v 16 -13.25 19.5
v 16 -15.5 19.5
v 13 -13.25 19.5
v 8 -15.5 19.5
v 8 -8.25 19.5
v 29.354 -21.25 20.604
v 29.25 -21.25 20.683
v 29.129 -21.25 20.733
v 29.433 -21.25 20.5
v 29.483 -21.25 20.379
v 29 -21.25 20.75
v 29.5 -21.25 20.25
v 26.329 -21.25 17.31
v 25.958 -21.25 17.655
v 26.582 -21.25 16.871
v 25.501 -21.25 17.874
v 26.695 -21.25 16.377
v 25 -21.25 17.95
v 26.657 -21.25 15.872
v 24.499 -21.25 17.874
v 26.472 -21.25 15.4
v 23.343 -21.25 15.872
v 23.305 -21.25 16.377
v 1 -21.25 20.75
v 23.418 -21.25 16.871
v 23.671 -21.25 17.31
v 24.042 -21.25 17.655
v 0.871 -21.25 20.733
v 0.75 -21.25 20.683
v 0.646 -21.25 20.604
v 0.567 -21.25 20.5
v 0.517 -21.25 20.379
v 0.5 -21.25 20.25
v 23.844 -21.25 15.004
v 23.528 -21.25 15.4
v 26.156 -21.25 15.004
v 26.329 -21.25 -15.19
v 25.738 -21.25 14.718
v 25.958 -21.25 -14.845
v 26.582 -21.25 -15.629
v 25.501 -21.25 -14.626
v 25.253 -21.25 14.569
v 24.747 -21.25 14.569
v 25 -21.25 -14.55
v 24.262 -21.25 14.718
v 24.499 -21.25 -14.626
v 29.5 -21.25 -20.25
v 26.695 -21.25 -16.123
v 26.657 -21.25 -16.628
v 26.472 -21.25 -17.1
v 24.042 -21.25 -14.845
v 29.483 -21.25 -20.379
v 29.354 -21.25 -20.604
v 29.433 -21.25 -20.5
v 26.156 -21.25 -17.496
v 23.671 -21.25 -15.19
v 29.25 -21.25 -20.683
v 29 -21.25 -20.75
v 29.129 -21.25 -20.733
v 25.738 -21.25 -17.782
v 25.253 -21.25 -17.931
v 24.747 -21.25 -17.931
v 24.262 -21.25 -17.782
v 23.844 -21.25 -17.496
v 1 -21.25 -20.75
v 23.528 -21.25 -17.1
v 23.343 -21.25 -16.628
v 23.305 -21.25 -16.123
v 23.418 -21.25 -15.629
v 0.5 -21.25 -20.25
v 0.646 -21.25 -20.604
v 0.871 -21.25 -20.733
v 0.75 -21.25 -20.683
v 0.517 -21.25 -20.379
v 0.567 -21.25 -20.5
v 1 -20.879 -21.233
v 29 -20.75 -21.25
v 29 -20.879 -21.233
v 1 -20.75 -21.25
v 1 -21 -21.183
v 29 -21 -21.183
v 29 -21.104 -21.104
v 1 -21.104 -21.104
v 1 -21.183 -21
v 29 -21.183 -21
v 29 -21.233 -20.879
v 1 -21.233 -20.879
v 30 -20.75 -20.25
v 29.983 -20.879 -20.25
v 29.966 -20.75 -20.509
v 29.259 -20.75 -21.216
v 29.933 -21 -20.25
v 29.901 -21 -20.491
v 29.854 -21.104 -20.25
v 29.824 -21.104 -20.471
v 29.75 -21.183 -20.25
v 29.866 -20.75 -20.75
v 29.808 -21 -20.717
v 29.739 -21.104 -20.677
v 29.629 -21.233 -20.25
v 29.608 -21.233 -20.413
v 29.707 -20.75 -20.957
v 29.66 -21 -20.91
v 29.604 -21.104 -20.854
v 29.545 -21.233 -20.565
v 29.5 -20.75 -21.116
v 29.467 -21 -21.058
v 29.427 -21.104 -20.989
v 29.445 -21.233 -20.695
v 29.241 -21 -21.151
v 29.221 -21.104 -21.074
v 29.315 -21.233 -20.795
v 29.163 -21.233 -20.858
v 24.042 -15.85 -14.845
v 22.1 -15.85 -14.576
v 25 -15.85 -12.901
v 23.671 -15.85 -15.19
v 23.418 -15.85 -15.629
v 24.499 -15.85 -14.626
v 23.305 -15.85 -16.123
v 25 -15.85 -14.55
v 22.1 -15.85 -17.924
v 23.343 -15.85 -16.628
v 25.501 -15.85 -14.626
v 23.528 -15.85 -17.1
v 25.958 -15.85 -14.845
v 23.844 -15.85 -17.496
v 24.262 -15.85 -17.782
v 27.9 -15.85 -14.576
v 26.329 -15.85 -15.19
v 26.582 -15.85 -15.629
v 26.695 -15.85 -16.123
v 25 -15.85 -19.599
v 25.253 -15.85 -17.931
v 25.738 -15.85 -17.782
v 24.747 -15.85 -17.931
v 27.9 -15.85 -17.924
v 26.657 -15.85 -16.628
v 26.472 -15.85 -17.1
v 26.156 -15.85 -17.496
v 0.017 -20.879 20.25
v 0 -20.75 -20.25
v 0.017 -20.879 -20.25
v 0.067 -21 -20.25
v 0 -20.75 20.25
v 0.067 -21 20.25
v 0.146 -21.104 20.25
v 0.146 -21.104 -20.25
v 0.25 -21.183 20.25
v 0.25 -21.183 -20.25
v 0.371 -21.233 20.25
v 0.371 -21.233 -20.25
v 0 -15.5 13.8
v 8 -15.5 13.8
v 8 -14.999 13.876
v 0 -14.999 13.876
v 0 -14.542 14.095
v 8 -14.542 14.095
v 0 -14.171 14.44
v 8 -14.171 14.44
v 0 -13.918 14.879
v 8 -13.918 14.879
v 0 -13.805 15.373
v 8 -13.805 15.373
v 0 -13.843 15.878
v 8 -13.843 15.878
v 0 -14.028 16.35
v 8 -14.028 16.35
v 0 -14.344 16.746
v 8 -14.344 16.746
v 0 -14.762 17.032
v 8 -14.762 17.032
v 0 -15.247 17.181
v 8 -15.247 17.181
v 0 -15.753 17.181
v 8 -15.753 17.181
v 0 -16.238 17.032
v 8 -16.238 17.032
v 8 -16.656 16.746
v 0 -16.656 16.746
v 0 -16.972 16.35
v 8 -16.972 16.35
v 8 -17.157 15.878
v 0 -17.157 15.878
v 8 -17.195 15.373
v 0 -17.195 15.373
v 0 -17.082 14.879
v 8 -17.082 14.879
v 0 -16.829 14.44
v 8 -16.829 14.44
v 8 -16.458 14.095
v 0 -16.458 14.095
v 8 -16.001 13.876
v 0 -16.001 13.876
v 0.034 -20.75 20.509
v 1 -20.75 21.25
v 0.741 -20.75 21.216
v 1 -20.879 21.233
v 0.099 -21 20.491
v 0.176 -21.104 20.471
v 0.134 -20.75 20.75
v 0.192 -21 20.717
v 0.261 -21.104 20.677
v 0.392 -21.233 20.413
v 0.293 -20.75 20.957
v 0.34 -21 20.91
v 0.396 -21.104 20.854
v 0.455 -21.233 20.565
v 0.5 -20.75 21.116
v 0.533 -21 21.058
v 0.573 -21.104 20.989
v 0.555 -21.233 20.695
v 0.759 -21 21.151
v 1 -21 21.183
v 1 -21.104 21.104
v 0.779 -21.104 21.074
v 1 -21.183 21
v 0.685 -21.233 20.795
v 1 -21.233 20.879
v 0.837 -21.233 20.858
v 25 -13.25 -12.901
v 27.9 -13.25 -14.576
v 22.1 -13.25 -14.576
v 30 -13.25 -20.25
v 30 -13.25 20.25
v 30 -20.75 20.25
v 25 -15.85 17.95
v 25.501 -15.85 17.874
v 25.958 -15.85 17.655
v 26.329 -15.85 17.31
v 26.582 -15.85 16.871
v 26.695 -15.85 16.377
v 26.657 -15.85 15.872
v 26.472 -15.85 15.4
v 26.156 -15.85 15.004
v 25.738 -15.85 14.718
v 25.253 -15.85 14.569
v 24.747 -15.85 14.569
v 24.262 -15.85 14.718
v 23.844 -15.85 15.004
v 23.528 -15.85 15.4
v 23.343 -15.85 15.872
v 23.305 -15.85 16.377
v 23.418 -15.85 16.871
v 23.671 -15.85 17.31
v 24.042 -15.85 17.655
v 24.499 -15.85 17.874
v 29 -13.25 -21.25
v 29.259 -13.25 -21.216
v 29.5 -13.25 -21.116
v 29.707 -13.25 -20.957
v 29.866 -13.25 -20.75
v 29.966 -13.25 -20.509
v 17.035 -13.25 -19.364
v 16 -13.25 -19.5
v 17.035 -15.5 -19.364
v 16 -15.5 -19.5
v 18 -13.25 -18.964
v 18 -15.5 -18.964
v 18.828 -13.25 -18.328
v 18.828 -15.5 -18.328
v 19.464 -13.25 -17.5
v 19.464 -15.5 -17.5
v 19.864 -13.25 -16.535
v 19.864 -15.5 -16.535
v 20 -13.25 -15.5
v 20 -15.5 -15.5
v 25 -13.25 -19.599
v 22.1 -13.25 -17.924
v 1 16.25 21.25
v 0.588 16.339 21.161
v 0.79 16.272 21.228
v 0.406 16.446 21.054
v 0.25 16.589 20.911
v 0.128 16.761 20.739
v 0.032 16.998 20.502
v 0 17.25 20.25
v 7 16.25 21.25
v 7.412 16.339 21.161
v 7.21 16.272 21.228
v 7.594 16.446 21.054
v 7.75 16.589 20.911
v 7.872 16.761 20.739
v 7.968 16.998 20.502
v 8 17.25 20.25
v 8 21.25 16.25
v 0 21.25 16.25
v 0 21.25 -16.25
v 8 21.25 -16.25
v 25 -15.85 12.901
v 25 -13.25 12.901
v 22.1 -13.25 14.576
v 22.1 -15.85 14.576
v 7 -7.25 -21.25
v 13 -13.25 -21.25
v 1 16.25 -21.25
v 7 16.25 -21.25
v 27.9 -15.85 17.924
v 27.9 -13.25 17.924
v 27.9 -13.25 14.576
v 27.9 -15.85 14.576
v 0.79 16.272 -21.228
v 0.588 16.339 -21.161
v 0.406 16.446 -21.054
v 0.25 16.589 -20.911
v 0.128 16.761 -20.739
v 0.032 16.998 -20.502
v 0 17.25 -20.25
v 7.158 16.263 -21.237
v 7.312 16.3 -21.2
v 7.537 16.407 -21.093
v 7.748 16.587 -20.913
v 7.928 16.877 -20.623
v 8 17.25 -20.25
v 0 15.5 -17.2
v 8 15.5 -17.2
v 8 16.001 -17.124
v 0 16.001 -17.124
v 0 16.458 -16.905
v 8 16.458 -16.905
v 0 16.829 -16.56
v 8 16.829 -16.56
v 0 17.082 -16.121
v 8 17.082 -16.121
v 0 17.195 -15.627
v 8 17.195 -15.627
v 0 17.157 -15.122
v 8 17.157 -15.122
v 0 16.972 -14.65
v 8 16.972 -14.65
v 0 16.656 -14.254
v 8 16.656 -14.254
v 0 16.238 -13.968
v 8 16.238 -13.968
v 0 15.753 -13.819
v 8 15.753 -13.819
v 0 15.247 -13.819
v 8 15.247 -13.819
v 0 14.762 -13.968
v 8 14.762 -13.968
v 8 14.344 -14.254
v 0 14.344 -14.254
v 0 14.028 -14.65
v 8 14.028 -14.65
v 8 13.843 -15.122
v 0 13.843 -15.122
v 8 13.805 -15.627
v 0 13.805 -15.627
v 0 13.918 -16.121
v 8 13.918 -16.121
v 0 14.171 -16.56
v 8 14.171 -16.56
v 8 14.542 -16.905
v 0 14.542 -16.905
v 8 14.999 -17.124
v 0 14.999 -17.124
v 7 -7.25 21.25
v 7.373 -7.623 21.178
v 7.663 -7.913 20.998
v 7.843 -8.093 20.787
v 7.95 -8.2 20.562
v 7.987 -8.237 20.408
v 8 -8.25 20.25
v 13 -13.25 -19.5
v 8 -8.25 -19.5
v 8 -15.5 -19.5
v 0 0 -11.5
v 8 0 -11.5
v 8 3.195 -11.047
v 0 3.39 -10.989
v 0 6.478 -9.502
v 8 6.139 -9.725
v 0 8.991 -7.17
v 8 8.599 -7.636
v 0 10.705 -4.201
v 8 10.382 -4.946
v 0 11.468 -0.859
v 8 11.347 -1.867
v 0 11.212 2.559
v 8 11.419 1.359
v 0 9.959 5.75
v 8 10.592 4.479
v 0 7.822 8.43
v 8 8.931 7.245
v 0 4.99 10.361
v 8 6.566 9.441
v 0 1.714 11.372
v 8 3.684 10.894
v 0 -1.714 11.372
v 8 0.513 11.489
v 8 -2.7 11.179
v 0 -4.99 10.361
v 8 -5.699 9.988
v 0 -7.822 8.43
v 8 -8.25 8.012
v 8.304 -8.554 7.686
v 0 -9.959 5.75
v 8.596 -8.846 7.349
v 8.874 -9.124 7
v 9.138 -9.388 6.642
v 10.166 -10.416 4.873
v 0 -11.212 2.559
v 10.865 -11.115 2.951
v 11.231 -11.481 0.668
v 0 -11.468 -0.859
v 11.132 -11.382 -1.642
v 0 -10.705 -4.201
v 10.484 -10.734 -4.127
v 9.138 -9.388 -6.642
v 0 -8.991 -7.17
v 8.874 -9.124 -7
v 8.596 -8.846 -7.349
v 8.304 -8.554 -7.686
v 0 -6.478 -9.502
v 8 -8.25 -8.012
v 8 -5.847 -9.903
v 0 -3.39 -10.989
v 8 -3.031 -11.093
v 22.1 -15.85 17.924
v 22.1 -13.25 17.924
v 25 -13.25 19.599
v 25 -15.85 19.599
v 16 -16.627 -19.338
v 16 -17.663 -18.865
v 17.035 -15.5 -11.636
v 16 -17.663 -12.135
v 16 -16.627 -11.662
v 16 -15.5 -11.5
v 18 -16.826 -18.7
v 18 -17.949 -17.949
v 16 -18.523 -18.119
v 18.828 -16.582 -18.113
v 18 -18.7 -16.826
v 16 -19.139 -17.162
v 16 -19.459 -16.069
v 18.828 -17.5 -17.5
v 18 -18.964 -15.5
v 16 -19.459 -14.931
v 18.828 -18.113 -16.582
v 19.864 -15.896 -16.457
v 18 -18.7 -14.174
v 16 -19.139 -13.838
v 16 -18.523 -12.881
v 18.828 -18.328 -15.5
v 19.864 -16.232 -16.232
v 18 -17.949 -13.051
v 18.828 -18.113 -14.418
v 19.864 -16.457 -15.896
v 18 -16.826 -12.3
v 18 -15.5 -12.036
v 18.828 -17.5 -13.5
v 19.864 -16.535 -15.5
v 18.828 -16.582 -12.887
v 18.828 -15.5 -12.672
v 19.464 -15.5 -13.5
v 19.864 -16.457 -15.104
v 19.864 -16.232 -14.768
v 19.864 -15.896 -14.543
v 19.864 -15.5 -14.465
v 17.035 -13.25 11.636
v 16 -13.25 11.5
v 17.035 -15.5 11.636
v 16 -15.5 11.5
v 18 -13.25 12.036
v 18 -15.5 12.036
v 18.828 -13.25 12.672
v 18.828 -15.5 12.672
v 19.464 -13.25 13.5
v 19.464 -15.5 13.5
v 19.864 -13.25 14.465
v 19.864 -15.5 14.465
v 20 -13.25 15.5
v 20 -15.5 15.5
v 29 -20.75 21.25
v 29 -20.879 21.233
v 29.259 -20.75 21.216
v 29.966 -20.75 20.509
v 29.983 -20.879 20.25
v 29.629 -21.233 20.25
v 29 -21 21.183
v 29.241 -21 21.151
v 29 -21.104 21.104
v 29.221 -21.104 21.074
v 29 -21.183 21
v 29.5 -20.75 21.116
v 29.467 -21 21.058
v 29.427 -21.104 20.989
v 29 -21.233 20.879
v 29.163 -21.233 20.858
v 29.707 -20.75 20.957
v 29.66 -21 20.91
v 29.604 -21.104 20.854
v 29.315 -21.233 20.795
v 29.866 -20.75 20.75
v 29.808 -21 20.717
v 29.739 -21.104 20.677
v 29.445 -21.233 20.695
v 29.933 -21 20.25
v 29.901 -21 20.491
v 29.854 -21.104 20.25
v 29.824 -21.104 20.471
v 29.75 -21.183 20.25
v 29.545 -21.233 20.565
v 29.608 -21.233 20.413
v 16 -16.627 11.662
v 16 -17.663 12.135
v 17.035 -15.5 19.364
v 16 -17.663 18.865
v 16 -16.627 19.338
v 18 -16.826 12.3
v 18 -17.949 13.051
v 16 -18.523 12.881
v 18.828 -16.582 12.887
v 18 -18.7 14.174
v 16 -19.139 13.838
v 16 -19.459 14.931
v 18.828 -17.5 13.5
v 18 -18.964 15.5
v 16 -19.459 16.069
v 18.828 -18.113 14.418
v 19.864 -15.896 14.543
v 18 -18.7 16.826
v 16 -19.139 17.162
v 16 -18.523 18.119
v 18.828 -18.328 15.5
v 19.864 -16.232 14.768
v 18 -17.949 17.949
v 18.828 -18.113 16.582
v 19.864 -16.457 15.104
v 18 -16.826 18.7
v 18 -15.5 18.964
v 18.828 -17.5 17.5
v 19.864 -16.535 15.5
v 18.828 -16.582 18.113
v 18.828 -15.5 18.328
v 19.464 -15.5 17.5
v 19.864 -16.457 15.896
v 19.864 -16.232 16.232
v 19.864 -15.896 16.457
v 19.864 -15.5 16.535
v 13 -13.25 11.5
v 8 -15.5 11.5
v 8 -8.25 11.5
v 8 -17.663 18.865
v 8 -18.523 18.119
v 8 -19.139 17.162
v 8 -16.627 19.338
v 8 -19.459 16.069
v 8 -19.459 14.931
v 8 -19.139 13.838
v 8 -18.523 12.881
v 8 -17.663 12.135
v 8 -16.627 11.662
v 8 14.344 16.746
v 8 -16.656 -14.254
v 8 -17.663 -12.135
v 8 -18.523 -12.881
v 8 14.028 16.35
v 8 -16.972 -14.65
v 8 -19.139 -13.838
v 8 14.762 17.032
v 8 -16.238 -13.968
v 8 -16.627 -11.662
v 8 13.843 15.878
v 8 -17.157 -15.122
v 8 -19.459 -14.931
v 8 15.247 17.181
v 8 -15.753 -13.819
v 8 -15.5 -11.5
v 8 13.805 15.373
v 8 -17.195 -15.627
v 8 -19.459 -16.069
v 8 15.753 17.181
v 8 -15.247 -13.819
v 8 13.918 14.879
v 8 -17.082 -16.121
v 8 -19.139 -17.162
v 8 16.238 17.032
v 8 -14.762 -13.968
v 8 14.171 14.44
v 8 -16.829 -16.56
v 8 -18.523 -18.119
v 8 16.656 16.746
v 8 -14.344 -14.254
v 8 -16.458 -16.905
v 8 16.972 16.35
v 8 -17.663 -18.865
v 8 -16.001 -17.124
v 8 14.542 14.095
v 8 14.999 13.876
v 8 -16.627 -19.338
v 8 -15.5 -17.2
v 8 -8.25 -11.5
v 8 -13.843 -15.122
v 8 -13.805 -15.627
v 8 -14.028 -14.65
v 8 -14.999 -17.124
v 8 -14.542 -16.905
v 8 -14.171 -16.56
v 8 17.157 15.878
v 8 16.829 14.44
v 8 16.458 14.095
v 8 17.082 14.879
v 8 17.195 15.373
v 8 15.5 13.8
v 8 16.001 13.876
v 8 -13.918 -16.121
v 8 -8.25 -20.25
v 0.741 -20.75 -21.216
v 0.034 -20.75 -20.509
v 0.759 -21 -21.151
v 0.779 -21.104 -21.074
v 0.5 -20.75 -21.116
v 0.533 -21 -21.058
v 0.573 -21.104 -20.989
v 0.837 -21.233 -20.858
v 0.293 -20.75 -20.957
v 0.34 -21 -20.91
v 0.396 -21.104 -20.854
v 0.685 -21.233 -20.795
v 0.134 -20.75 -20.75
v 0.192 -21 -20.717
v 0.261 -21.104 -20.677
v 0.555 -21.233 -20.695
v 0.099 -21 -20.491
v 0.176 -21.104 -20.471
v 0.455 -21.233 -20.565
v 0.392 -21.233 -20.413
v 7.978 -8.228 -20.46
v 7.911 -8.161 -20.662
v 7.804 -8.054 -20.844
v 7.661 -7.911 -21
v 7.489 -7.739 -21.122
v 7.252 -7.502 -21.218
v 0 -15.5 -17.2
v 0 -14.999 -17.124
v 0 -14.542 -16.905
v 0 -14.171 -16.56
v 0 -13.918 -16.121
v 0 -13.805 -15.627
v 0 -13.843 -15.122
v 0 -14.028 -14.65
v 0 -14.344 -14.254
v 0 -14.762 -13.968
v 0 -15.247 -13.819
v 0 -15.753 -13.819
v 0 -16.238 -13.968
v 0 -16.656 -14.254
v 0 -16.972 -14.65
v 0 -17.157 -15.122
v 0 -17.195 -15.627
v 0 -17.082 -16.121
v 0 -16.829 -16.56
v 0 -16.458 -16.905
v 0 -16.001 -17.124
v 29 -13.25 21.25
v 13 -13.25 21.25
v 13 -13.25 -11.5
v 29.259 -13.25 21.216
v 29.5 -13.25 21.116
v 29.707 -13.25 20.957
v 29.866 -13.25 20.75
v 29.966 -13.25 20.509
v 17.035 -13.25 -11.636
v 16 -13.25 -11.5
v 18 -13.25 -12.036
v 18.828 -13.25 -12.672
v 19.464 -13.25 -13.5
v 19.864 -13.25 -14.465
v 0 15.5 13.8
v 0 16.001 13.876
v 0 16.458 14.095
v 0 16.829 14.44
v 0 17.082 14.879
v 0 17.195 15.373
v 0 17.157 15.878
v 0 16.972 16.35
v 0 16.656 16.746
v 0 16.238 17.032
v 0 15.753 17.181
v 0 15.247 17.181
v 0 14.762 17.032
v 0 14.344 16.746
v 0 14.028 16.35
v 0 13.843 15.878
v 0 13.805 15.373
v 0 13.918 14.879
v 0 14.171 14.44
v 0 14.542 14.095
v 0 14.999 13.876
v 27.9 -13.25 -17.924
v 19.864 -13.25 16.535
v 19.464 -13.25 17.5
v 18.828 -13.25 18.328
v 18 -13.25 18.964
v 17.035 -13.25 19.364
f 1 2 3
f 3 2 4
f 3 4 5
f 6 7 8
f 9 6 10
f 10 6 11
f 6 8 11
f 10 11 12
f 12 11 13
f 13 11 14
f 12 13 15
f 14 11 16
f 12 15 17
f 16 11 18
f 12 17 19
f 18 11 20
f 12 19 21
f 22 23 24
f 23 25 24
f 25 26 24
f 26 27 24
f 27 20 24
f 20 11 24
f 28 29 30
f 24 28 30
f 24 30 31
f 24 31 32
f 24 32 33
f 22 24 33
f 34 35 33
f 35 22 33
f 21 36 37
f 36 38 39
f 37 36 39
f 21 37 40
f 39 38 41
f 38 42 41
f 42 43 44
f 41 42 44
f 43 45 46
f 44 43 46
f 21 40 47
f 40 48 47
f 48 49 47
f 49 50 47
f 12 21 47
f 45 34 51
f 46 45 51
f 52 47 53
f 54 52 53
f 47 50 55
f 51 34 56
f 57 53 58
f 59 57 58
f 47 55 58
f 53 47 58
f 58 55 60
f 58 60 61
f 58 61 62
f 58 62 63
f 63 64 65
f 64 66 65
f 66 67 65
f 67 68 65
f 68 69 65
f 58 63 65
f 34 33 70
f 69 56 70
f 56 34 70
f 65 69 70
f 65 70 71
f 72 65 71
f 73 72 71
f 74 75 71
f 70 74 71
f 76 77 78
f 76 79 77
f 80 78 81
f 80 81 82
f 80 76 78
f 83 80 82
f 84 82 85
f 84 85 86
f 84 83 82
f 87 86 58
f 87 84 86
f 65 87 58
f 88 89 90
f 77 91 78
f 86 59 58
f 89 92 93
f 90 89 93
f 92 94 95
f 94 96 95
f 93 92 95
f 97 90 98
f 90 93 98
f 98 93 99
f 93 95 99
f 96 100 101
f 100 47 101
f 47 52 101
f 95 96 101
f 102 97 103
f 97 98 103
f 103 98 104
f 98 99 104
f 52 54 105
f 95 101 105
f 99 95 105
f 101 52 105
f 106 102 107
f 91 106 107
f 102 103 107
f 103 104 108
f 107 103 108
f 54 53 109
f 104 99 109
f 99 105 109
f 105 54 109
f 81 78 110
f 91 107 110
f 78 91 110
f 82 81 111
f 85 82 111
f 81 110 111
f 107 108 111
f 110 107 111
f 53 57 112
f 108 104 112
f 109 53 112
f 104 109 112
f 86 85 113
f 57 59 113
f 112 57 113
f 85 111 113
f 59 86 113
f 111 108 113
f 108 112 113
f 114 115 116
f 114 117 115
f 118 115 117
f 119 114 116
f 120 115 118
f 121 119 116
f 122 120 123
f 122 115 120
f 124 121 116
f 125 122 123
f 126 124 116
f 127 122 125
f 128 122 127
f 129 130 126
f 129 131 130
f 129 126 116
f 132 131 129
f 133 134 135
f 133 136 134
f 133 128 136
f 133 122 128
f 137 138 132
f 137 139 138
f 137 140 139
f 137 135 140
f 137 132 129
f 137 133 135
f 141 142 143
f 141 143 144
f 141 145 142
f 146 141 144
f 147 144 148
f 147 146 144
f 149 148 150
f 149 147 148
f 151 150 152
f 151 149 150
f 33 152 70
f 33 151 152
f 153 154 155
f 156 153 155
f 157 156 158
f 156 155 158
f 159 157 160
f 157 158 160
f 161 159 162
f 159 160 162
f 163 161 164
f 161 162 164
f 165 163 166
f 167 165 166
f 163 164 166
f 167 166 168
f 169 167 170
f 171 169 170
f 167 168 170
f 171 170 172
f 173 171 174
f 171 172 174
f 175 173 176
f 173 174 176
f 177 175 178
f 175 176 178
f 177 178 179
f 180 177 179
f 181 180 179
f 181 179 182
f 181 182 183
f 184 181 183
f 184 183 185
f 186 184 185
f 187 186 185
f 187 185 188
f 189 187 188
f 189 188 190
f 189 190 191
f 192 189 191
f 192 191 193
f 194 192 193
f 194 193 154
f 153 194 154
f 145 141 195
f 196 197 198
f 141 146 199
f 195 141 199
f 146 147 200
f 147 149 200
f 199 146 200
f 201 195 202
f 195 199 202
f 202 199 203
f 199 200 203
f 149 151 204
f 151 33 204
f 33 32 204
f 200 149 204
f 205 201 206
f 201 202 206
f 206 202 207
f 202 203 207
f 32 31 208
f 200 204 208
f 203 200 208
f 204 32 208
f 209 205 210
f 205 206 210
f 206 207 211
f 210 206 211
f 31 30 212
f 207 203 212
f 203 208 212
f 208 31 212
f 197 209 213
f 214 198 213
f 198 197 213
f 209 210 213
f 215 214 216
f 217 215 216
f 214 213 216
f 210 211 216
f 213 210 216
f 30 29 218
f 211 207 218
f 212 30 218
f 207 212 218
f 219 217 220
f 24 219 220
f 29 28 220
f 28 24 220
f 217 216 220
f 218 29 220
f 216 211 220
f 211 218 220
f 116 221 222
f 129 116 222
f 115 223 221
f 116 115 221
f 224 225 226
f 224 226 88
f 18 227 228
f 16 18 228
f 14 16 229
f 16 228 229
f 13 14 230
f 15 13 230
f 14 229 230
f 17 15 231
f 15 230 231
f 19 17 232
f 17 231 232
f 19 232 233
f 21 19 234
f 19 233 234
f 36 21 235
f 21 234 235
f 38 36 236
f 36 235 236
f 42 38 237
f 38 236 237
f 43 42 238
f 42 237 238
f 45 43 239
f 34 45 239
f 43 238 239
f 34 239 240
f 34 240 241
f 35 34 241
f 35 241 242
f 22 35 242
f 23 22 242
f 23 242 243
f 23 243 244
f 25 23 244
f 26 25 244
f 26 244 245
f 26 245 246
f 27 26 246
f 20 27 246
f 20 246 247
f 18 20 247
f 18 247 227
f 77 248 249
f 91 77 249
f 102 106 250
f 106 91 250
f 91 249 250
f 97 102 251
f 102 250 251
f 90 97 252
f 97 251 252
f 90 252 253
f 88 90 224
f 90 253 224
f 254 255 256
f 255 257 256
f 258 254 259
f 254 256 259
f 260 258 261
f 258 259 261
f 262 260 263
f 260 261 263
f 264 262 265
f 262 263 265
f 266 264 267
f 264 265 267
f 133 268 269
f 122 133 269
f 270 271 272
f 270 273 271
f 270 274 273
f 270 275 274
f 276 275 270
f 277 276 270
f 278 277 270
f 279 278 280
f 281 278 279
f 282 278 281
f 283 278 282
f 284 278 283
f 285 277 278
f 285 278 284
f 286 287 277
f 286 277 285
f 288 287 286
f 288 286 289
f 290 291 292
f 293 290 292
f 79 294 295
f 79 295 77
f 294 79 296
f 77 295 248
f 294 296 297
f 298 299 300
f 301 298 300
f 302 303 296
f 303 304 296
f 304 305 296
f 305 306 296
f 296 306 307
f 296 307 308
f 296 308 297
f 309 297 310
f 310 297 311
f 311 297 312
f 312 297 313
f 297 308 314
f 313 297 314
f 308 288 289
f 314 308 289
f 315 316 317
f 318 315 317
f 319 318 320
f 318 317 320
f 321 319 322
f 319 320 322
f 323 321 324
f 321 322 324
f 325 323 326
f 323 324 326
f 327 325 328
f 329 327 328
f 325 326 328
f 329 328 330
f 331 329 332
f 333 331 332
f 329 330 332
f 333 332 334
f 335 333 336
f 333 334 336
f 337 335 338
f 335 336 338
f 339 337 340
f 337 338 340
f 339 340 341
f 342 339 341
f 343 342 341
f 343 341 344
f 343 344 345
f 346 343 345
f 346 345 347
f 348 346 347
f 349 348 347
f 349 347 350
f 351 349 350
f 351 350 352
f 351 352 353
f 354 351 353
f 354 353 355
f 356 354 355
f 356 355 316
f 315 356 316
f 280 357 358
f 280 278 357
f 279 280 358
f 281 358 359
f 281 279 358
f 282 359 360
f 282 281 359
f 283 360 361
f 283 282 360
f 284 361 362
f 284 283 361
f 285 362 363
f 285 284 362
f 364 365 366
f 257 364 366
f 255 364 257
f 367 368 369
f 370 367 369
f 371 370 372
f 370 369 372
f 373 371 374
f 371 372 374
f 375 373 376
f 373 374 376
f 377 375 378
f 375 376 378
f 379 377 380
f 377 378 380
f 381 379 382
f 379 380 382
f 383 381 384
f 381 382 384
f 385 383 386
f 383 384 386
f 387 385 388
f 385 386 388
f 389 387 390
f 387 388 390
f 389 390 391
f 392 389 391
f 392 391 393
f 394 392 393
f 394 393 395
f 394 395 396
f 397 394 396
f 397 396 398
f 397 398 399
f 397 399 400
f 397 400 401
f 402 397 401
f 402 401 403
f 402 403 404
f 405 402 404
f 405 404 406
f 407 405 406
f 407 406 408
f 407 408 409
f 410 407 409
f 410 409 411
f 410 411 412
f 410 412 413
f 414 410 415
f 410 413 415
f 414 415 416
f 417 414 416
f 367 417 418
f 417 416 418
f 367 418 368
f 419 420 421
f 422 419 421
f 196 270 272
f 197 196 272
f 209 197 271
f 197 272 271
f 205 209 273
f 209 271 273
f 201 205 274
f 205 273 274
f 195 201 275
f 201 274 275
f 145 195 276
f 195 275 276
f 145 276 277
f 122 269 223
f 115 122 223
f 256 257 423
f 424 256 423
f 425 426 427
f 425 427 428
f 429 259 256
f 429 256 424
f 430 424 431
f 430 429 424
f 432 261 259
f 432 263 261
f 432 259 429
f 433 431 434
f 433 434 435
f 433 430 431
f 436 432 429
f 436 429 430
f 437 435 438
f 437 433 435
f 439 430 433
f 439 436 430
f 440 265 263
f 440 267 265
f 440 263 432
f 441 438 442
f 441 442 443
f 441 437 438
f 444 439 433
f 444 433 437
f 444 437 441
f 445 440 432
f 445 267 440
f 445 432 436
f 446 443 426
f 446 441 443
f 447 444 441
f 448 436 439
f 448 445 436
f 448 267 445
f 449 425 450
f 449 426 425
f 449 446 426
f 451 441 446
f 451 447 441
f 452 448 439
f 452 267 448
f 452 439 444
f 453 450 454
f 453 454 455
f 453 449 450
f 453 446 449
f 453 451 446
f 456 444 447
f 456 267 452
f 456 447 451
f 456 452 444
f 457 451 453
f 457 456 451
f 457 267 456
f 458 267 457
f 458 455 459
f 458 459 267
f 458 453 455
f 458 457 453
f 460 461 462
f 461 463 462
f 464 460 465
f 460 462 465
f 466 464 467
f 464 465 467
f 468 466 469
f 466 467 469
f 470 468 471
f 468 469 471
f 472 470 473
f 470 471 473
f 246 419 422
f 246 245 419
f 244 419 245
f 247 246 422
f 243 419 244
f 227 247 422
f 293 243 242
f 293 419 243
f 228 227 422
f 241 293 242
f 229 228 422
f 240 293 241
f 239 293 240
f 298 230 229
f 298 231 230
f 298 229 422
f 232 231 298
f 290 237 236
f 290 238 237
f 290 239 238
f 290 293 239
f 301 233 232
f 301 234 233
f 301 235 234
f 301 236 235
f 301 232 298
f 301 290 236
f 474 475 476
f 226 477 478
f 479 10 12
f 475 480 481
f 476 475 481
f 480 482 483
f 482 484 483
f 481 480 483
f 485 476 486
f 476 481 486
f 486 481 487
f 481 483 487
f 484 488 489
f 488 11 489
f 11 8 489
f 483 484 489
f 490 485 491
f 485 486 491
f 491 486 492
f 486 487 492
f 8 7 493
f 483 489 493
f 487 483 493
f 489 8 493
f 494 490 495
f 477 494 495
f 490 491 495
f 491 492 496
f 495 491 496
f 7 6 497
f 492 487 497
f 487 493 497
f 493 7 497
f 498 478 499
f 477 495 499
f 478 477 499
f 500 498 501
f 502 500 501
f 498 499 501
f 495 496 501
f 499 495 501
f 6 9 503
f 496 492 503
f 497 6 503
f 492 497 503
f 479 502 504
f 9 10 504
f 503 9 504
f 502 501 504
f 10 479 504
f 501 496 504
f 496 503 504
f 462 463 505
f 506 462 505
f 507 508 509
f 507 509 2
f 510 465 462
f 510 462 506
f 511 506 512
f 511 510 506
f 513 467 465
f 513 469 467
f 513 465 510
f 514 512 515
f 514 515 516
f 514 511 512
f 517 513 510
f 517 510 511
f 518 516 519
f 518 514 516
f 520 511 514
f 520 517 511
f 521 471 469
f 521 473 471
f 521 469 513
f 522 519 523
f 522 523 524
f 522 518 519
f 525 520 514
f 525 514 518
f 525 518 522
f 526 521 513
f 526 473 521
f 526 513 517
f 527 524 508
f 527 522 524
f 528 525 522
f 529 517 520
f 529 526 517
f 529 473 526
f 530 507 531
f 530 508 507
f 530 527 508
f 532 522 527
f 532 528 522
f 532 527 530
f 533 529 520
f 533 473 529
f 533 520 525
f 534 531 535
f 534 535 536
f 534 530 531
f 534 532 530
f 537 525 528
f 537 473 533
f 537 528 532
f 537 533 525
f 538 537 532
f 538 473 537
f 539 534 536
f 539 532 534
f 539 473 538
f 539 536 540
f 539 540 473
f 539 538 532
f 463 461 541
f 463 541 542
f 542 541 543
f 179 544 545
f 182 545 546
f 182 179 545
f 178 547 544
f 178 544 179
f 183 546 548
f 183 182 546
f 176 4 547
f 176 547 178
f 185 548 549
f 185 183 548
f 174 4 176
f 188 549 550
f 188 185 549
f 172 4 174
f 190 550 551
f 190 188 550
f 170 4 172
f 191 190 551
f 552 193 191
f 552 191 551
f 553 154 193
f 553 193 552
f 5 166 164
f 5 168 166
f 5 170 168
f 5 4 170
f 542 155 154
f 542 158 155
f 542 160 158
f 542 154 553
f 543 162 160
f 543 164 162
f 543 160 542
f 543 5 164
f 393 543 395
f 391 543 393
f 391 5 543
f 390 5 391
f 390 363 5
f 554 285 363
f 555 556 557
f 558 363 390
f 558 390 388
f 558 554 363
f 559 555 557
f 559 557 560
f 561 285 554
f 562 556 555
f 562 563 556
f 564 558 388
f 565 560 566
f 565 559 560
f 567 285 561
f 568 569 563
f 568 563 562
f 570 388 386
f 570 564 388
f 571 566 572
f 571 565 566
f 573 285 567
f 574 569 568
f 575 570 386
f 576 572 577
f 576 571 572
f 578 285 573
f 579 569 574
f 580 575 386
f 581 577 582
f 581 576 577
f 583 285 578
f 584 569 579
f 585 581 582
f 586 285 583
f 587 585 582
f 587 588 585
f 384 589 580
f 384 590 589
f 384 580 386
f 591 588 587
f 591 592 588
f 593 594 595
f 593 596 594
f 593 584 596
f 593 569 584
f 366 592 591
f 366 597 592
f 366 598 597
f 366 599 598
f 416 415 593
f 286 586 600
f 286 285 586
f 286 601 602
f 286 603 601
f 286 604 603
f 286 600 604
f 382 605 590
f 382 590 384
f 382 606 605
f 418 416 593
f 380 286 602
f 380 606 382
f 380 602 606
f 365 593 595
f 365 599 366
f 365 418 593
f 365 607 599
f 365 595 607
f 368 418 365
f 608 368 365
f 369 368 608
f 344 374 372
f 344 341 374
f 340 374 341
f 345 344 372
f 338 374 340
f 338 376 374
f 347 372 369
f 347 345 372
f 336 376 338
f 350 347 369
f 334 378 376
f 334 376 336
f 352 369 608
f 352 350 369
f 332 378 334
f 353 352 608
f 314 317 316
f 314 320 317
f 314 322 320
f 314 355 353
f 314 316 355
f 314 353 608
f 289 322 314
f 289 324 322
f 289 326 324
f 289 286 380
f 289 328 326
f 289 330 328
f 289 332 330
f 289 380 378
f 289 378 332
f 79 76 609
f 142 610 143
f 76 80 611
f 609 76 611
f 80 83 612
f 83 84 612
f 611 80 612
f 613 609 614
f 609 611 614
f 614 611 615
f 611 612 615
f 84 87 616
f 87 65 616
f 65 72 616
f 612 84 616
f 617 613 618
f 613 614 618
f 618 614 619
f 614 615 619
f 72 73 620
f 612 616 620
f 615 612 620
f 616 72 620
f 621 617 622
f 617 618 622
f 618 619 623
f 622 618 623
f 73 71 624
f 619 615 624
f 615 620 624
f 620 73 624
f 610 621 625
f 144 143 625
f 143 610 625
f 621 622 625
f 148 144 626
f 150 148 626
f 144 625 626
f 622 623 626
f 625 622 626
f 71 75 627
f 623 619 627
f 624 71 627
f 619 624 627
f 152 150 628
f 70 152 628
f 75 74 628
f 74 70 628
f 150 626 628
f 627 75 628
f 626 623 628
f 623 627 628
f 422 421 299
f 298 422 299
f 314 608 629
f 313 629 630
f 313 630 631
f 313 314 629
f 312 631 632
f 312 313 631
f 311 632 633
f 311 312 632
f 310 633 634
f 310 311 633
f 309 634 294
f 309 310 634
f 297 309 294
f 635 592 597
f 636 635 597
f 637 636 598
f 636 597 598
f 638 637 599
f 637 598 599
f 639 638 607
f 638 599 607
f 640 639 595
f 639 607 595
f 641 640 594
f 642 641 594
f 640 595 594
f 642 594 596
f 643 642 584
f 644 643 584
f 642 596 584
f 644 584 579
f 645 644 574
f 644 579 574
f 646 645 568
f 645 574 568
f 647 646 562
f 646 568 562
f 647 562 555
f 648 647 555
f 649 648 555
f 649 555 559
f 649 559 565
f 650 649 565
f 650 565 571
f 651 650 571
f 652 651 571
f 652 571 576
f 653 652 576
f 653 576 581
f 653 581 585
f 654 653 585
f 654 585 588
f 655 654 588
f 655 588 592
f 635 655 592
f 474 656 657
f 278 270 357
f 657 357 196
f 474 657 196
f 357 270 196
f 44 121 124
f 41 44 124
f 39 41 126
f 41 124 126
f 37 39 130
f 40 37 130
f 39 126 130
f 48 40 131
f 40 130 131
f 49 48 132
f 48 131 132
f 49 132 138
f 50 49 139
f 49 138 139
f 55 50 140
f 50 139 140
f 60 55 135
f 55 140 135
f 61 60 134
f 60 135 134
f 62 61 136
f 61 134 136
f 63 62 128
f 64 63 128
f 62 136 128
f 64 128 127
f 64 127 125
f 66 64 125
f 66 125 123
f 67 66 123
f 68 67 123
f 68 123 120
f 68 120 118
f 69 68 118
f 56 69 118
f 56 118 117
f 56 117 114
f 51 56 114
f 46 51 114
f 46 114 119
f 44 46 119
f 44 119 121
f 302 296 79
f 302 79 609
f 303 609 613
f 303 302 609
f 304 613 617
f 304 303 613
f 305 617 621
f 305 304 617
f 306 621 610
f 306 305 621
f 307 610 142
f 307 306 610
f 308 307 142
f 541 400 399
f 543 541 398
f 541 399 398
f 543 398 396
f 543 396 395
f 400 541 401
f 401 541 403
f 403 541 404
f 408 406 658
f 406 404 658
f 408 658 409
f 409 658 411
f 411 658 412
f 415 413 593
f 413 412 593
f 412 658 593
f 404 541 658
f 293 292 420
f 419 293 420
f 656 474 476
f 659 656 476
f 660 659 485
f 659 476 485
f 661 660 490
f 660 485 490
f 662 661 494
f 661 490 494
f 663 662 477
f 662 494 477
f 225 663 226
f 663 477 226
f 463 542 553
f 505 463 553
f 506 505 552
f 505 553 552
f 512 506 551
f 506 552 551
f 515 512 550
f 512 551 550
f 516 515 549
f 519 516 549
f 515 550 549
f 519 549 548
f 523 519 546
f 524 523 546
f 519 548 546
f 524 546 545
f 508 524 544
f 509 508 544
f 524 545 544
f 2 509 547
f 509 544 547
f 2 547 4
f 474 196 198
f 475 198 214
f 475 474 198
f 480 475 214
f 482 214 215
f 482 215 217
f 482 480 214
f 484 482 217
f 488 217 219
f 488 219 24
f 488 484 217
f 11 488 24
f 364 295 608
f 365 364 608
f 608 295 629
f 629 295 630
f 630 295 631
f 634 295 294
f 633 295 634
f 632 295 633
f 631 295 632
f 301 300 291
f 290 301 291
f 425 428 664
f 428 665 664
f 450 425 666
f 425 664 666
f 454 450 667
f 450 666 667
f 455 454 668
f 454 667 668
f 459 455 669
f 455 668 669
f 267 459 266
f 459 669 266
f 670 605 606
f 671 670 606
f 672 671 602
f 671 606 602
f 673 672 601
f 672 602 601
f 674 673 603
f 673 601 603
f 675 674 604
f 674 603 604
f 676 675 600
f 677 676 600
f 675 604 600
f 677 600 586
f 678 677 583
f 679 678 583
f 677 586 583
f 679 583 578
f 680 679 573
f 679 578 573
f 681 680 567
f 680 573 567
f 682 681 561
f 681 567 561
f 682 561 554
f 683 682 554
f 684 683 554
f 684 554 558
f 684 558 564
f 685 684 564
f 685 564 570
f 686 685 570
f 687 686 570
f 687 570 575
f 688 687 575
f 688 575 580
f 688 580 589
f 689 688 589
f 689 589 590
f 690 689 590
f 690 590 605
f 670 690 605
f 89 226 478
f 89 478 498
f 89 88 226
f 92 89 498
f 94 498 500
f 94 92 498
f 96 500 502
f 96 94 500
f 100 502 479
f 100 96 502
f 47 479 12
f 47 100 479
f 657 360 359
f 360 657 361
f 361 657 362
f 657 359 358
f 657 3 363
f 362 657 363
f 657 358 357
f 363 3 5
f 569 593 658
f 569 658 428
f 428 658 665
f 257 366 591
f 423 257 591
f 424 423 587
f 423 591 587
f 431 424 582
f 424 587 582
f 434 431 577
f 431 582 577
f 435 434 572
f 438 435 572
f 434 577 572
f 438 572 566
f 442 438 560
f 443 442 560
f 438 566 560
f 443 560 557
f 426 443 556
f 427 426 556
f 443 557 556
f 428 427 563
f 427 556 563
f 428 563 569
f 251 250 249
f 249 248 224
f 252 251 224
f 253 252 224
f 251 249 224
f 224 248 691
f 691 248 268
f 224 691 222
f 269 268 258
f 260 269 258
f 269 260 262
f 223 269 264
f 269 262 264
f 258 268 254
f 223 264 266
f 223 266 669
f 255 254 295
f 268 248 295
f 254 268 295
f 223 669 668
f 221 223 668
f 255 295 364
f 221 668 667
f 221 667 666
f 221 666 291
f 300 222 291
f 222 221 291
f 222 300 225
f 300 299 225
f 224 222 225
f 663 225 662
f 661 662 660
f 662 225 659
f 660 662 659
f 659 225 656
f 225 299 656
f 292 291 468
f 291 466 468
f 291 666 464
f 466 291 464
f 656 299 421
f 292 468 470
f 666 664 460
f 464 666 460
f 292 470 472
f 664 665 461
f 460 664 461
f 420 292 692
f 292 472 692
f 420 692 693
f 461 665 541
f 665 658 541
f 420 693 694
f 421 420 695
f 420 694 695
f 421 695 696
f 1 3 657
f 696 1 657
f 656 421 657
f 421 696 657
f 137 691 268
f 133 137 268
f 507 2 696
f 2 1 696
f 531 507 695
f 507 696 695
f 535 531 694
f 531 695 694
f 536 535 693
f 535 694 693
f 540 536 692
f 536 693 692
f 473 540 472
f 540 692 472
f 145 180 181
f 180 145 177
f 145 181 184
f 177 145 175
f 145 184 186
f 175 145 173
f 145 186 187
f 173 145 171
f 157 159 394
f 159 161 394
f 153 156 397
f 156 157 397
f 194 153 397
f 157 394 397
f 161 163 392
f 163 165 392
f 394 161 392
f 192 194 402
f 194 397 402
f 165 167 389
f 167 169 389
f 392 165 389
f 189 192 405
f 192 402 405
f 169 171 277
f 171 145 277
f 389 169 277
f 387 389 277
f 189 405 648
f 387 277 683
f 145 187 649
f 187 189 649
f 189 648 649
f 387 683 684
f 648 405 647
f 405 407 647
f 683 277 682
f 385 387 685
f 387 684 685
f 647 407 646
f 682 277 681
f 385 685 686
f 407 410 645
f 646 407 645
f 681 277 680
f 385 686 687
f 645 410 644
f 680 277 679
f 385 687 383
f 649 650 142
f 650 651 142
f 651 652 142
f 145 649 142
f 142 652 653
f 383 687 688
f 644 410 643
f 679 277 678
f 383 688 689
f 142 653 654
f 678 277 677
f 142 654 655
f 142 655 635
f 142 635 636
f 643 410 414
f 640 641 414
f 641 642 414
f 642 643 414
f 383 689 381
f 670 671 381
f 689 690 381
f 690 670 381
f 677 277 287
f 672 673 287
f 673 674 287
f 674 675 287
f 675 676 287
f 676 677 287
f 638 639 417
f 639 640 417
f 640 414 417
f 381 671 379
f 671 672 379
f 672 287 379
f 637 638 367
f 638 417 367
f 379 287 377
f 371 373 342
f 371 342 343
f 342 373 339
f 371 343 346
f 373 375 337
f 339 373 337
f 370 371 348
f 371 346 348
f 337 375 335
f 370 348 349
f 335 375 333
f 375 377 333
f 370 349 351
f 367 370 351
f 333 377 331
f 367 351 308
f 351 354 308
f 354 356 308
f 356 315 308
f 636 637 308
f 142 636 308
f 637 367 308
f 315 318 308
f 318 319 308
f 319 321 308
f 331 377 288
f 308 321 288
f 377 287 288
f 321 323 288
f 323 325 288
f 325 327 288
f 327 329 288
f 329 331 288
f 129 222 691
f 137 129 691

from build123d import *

# Parameters (mm, degrees)
SKETCH1_W           = 42.5
SKETCH1_H           = 42.5
BOSS_EXTRUDE1_DEPTH = 8
SKETCH2_R           = 1.7
SKETCH2_R_2         = 11.5
CUT_EXTRUDE1_DEPTH  = 35
BOSS_EXTRUDE2_DEPTH = 22
BOSS_EXTRUDE3_REACH = 52.416
SKETCH5_W           = 10
SKETCH5_H           = 42.5
FILLET1_R           = 4
FILLET2_R           = 4
CHAMFER2_SIZE       = 5
CUT_EXTRUDE2_DEPTH  = 2.6
SKETCH7_R           = 1.7
CUT_EXTRUDE3_DEPTH  = 10.6
CHAMFER3_SIZE       = 5
FILLET3_R           = 1
FILLET4_R           = 1
FILLET5_R           = 0.5


# Some blends are built 0.0001 mm under size
with BuildPart() as part:
    # Sketch1 → Boss-Extrude1 (new body)
    with BuildSketch(Plane(origin=(0, 0, 0), x_dir=(0, 0, -1), z_dir=(1, 0, 0))):
        Rectangle(SKETCH1_W, SKETCH1_H)
    extrude(amount=BOSS_EXTRUDE1_DEPTH)

    # Sketch2 → Cut-Extrude1 (cut)
    with BuildSketch(Plane(origin=(8, 0, 0), x_dir=(0, 0, -1), z_dir=(1, 0, 0))):
        with Locations((-15.5, 15.5)):
            Circle(SKETCH2_R)
        with Locations((15.5, 15.5)):
            Circle(SKETCH2_R)
        with Locations((-15.5, -15.5)):
            Circle(SKETCH2_R)
        with Locations((15.5, -15.5)):
            Circle(SKETCH2_R)
        Circle(SKETCH2_R_2)
    extrude(amount=-CUT_EXTRUDE1_DEPTH, mode=Mode.SUBTRACT)

    # Sketch3 → Boss-Extrude2 (add)
    with BuildSketch(Plane(origin=(8, 0, 0), x_dir=(0, 0, -1), z_dir=(1, 0, 0))):
        with BuildLine():
            Line((-19.5, -13.25), (-21.25, -13.25))
            Line((-21.25, -13.25), (-21.25, -21.25))
            Line((-21.25, -21.25), (21.25, -21.25))
            Line((21.25, -21.25), (21.25, -13.25))
            Line((21.25, -13.25), (19.5, -13.25))
            Line((19.5, -13.25), (19.5, -15.5))
            ThreePointArc((19.5, -15.5), (15.5, -19.5), (11.5, -15.5))
            Line((11.5, -15.5), (11.5, -13.25))
            Line((11.5, -13.25), (-11.5, -13.25))
            Line((-11.5, -13.25), (-11.5, -15.5))
            ThreePointArc((-11.5, -15.5), (-15.5, -19.5), (-19.5, -15.5))
            Line((-19.5, -15.5), (-19.5, -13.25))
        make_face()
    extrude(amount=BOSS_EXTRUDE2_DEPTH)

    # Boss-Extrude3: up to this face of the body (flat: up to its plane)
    boss_extrude3_end = Plane(part.part.faces().sort_by_distance((15, -21.25, 0))[0])
    # Sketch5 → Boss-Extrude3 (add, up to the picked face)
    with BuildSketch(Plane(origin=(0, -13.25, 0), x_dir=(1, 0, 0), z_dir=(0, 1, 0)), mode=Mode.PRIVATE) as boss_extrude3_sk1:
        with Locations((25, 0)):
            Rectangle(SKETCH5_W, SKETCH5_H)
    boss_extrude3_tool1 = split(extrude(boss_extrude3_sk1.sketch, amount=-BOSS_EXTRUDE3_REACH, mode=Mode.PRIVATE), bisect_by=boss_extrude3_end, keep=Keep.BOTH, mode=Mode.PRIVATE)
    add(boss_extrude3_tool1.solids().sort_by(Axis((25, -13.25, 0), (0, -1, 0)))[0])

    # Fillet1
    fillet1_edges = [part.edges().sort_by_distance(p)[0] for p in [
        (20, -14.375, 11.5),
        (20, -19.5, 15.5),
        (20, -14.375, 19.5),
    ]]
    fillet(fillet1_edges, radius=FILLET1_R - 0.0001)  # a hair under: the kernel refuses the full size

    # Fillet2
    fillet2_edges = [part.edges().sort_by_distance(p)[0] for p in [
        (20, -14.375, -11.5),
        (20, -19.5, -15.5),
        (20, -14.375, -19.5),
    ]]
    fillet(fillet2_edges, radius=FILLET2_R - 0.0001)  # a hair under: the kernel refuses the full size

    # Chamfer2
    # the kernel refuses this chamfer: 5 mm, written as the material it adds along each edge
    with BuildSketch(Plane(origin=(8, -13.25, -21.25), x_dir=(0.9996219169112968, -0.027495876610586317, 0), z_dir=(0, 0, 1)), Plane(origin=(8, -13.25, 19.5), x_dir=(0.9996219169112968, -0.027495876610586317, 0), z_dir=(0, 0, 1))) as chamfer2_piece_1:
        Polygon((CHAMFER2_SIZE * 0.999621916911, CHAMFER2_SIZE * 0.0274958766106), (-CHAMFER2_SIZE * 0.0274958766106, CHAMFER2_SIZE * 0.999621916911), (0, 0), align=None)
    extrude(amount=1.75)
    with BuildSketch(Plane(origin=(8, -13.25, -21.25), x_dir=(0.9996219169112968, -0.027495876610586317, 0), z_dir=(0, 0, 1))) as chamfer2_piece_2_section:
        Polygon((CHAMFER2_SIZE * 0.999621916911, CHAMFER2_SIZE * 0.0274958766106), (-CHAMFER2_SIZE * 0.0274958766106, CHAMFER2_SIZE * 0.999621916911), (0, 0), align=None)
    chamfer2_piece_2 = extrude(amount=14.60841494, mode=Mode.PRIVATE)
    chamfer2_piece_2 = split(chamfer2_piece_2, bisect_by=Plane(origin=(9.660792582, -11.623563686, -11.5), z_dir=(0, 0, 1)), keep=Keep.TOP, mode=Mode.PRIVATE)
    chamfer2_piece_2 = chamfer2_piece_2 - Plane(origin=(9.660792582, 0, 0), x_dir=(0, 0, -1), z_dir=(1, 0, 0)) * Cylinder(11.5, 50, mode=Mode.PRIVATE)
    add(chamfer2_piece_2)
    with BuildSketch(Plane(origin=(8, -13.25, 6.64158506), x_dir=(0.9996219169112968, -0.027495876610586313, 0), z_dir=(0, 0, 1))) as chamfer2_piece_3_section:
        Polygon((CHAMFER2_SIZE * 0.999621916911, CHAMFER2_SIZE * 0.0274958766106), (-CHAMFER2_SIZE * 0.0274958766106, CHAMFER2_SIZE * 0.999621916911), (0, 0), align=None)
    chamfer2_piece_3 = extrude(amount=14.60841494, mode=Mode.PRIVATE)
    chamfer2_piece_3 = split(chamfer2_piece_3, bisect_by=Plane(origin=(9.660792582, -11.623563686, 11.5), z_dir=(0, 0, -1)), keep=Keep.TOP, mode=Mode.PRIVATE)
    chamfer2_piece_3 = chamfer2_piece_3 - Plane(origin=(9.660792582, 0, 0), x_dir=(0, 0, -1), z_dir=(1, 0, 0)) * Cylinder(11.5, 50, mode=Mode.PRIVATE)
    add(chamfer2_piece_3)
    with BuildSketch(Plane(origin=(8, -13.25, -24.35841494), x_dir=(0.9996219169112968, -0.027495876610586313, 0), z_dir=(0, 0, 1))) as chamfer2_piece_4_section:
        Polygon((CHAMFER2_SIZE * 0.999621916911, CHAMFER2_SIZE * 0.0274958766106), (-CHAMFER2_SIZE * 0.0274958766106, CHAMFER2_SIZE * 0.999621916911), (0, 0), align=None)
    chamfer2_piece_4 = extrude(amount=35.85841494, mode=Mode.PRIVATE)
    chamfer2_piece_4 = split(chamfer2_piece_4, bisect_by=Plane(origin=(9.648968134, -11.601031866, -19.5), z_dir=(0, 0, -1)), keep=Keep.TOP, mode=Mode.PRIVATE)
    chamfer2_piece_4 = split(chamfer2_piece_4, bisect_by=Plane(origin=(9.648968134, -11.601031866, -21.25), z_dir=(0, 0, 1)), keep=Keep.TOP, mode=Mode.PRIVATE)
    add(chamfer2_piece_4)
    with BuildSketch(Plane(origin=(8, -13.25, -11.5), x_dir=(0.9996219169112968, -0.027495876610586317, 0), z_dir=(0, 0, 1))) as chamfer2_piece_5_section:
        Polygon((CHAMFER2_SIZE * 0.999621916911, CHAMFER2_SIZE * 0.0274958766106), (-CHAMFER2_SIZE * 0.0274958766106, CHAMFER2_SIZE * 0.999621916911), (0, 0), align=None)
    chamfer2_piece_5 = extrude(amount=23, mode=Mode.PRIVATE)
    chamfer2_piece_5 = chamfer2_piece_5 - Plane(origin=(9.815143963, 0, 0), x_dir=(0, 0, -1), z_dir=(1, 0, 0)) * Cylinder(11.5, 66, mode=Mode.PRIVATE)
    add(chamfer2_piece_5)
    with BuildSketch(Plane(origin=(8, -13.25, -11.5), x_dir=(0.9996219169112968, -0.027495876610586317, 0), z_dir=(0, 0, 1))) as chamfer2_piece_6_section:
        Polygon((CHAMFER2_SIZE * 0.999621916911, CHAMFER2_SIZE * 0.0274958766106), (-CHAMFER2_SIZE * 0.0274958766106, CHAMFER2_SIZE * 0.999621916911), (0, 0), align=None)
    chamfer2_piece_6 = extrude(amount=35.85841494, mode=Mode.PRIVATE)
    chamfer2_piece_6 = split(chamfer2_piece_6, bisect_by=Plane(origin=(9.648968134, -11.601031866, 19.5), z_dir=(0, 0, 1)), keep=Keep.TOP, mode=Mode.PRIVATE)
    chamfer2_piece_6 = split(chamfer2_piece_6, bisect_by=Plane(origin=(9.648968134, -11.601031866, 21.25), z_dir=(0, 0, -1)), keep=Keep.TOP, mode=Mode.PRIVATE)
    add(chamfer2_piece_6)

    # Sketch6 → Cut-Extrude2 (cut)
    with BuildSketch(Plane(origin=(0, -13.25, 0), x_dir=(1, 0, 0), z_dir=(0, 1, 0))):
        Polygon((25, 12.901368439), (27.9, 14.575684219), (27.9, 17.924315781), (25, 19.598631561), (22.1, 17.924315781), (22.1, 14.575684219), align=None)
        Polygon((25, -19.598631561), (27.9, -17.924315781), (27.9, -14.575684219), (25, -12.901368439), (22.1, -14.575684219), (22.1, -17.924315781), align=None)
    extrude(amount=-CUT_EXTRUDE2_DEPTH, mode=Mode.SUBTRACT)

    # Sketch7 → Cut-Extrude3 (cut)
    with BuildSketch(Plane(origin=(0, -15.85, 0), x_dir=(1, 0, 0), z_dir=(0, 1, 0))):
        with Locations(Location((25, 16.25, 0), (0, 0, 270))):
            Circle(SKETCH7_R)
        with Locations(Location((25, -16.25, 0), (0, 0, 270))):
            Circle(SKETCH7_R)
    extrude(amount=-CUT_EXTRUDE3_DEPTH, mode=Mode.SUBTRACT)

    # Chamfer3
    chamfer3_edges = [part.edges().sort_by_distance(p)[0] for p in [
        (4, 21.25, 21.25),
        (4, 21.25, -21.25),
    ]]
    chamfer(chamfer3_edges, length=CHAMFER3_SIZE)

    # Fillet3
    fillet3_edges = [part.edges().sort_by_distance(p)[0] for p in [
        (0, -2.5, 21.25),
        (30, -17.25, 21.25),
        (30, -17.25, -21.25),
        (0, -2.5, -21.25),
    ]]
    fillet(fillet3_edges, radius=FILLET3_R)

    # Fillet4
    fillet4_edges = [part.edges().sort_by_distance(p)[0] for p in [
        (8, 4, -21.25),
        (8, 4, 21.25),
    ]]
    fillet(fillet4_edges, radius=FILLET4_R)

    # Fillet5
    fillet5_edges = [part.edges().sort_by_distance(p)[0] for p in [
        (30, -21.25, 0),
        (15, -21.25, -21.25),
        (0, -21.25, 0),
        (15, -21.25, 21.25),
        (29.707106781, -21.25, 20.957106781),
        (0.292893219, -21.25, 20.957106781),
        (0.292893219, -21.25, -20.957106781),
        (29.707106781, -21.25, -20.957106781),
    ]]
    fillet(fillet5_edges, radius=FILLET5_R)


solid = part.part
